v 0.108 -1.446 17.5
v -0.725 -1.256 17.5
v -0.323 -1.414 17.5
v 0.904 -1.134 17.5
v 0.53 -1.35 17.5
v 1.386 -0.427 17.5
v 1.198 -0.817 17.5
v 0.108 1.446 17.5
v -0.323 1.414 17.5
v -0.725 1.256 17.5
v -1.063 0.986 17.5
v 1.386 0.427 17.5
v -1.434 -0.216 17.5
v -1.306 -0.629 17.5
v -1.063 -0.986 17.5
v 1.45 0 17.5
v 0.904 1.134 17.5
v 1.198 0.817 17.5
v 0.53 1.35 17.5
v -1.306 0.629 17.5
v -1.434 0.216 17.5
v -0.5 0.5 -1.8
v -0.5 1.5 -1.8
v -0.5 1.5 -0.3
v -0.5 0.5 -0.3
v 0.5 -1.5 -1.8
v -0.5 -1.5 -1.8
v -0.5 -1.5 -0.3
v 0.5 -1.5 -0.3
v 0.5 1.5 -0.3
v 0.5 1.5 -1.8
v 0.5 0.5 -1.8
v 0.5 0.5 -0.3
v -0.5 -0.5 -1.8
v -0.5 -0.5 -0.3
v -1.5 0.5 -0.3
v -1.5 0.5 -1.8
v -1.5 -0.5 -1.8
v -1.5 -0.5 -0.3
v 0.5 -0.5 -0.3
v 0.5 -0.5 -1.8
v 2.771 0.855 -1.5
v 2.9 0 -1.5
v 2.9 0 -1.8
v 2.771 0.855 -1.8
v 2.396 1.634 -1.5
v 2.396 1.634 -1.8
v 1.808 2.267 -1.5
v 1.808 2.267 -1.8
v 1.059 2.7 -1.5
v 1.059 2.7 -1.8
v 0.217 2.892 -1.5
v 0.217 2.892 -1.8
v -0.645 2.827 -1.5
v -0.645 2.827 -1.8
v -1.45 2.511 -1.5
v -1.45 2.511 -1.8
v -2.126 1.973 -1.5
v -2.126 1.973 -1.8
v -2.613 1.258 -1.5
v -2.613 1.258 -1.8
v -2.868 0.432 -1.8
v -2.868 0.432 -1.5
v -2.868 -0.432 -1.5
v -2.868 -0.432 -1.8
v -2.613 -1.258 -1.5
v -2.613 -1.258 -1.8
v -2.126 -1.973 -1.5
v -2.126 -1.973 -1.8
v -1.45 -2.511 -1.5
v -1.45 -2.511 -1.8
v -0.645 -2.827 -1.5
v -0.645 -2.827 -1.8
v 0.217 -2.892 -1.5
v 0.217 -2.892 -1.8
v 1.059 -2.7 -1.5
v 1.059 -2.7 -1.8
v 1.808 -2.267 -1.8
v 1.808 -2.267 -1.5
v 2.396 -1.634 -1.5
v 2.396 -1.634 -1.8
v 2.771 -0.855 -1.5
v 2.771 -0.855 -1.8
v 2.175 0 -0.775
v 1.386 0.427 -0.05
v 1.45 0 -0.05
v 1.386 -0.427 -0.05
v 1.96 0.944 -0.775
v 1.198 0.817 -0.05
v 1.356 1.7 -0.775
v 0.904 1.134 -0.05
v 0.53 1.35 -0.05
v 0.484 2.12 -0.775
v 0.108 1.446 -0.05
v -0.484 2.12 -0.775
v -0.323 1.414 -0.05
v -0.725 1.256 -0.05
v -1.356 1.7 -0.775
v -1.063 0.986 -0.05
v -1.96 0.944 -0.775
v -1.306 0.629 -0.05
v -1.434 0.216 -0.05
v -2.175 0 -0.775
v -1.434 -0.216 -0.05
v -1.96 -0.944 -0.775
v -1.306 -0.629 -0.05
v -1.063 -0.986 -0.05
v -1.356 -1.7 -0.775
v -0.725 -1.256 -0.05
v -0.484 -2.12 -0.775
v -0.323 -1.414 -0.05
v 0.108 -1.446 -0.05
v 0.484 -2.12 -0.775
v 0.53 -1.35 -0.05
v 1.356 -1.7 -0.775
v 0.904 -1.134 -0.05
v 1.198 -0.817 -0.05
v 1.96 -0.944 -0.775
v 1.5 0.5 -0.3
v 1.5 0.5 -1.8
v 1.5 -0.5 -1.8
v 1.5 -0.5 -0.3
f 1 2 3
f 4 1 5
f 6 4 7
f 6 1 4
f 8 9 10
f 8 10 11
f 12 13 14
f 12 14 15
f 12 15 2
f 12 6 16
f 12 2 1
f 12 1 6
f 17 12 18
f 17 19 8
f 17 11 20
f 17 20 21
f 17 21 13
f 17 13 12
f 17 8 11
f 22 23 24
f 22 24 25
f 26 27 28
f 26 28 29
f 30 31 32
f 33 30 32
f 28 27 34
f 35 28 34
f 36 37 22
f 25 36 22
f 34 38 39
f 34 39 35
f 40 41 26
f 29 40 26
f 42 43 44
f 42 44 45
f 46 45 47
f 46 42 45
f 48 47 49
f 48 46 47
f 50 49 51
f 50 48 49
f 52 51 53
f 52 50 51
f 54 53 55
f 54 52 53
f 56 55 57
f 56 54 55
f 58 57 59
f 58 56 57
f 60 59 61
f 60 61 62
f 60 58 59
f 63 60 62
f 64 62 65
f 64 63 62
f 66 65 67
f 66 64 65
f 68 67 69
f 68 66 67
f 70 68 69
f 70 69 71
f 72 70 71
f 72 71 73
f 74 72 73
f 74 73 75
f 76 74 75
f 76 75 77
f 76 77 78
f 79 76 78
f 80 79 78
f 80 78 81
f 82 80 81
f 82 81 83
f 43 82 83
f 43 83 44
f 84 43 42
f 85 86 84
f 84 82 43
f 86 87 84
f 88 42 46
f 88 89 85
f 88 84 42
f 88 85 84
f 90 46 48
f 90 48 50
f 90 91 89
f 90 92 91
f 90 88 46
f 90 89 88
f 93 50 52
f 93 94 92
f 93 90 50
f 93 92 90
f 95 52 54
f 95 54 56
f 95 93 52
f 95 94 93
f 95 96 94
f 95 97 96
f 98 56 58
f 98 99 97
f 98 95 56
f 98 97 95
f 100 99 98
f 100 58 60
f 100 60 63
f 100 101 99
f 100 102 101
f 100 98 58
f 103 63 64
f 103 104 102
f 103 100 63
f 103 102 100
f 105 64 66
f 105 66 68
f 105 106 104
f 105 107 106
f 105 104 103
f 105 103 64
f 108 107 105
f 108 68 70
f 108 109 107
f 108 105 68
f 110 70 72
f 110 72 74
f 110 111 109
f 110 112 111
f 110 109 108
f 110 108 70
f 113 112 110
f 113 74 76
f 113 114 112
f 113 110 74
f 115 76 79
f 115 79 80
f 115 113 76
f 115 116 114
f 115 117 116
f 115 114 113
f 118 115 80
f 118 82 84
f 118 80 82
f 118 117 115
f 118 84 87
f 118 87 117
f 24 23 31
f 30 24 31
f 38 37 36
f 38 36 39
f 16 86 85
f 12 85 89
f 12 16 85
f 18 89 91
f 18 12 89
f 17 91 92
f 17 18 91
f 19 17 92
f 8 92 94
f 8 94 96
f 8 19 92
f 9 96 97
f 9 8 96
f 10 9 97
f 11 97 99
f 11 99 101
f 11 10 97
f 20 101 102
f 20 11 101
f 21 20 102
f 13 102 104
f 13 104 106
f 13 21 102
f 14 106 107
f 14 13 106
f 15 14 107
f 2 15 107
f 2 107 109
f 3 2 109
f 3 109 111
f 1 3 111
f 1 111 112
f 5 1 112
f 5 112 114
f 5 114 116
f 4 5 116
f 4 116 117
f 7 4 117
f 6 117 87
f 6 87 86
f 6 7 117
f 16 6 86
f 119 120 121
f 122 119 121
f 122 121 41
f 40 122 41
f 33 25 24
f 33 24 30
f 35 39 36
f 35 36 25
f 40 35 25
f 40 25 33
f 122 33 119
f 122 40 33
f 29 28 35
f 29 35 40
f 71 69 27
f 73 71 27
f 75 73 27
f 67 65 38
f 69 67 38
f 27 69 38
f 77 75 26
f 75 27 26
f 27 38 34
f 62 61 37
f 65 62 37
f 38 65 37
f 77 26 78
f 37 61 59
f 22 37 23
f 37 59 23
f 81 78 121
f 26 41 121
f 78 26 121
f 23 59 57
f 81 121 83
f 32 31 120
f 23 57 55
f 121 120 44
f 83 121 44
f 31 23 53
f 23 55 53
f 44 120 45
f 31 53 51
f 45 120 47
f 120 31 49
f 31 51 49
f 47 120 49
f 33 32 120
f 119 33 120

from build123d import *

# Parameters (mm, degrees)
F0_R        = 1.45
F1_DEPTH    = 17.5
F2_R        = 2.9
F3_DEPTH    = 1.8
F4_W        = 1
F4_H        = 1
F5_DEPTH    = 1.5
F6_S5_R     = 1.45
F6_T6_DEPTH = 6


# Not quite as in the source:
# - a fillet or chamfer that OpenCascade refuses, or shapes differently, is made with other operations: its cross-section is extruded or revolved along the edge and cut away or added


with BuildPart() as f1:
    # F0 (on Top) → F1 (new body)
    with BuildSketch(Plane.XY):
        Circle(F0_R)
    extrude(amount=F1_DEPTH)

    # F2 (on Top) → F3 (join)
    with BuildSketch(Plane.XY):
        Circle(F2_R)
    extrude(amount=-F3_DEPTH)

    # F4 (on face) → F5 (cut)
    with BuildSketch(Plane(origin=(0, 0, -1.8), x_dir=(1, 0, 0), z_dir=(0, 0, -1))):
        with Locations((1, 0)):
            Rectangle(F4_W, F4_H)
        Rectangle(F4_W, F4_H)
        with Locations((0, 1)):
            Rectangle(F4_W, F4_H)
        with Locations((-1, 0)):
            Rectangle(F4_W, F4_H)
        with Locations((0, -1)):
            Rectangle(F4_W, F4_H)
    extrude(amount=-F5_DEPTH, mode=Mode.SUBTRACT)

    # F6: chamfer of 1.5 on 1 edges, made by hand


with BuildPart() as f6_tool2:
    # F6_s3 → F6_t4 (revolve)
    with BuildSketch(Plane.XZ):
        Polygon((2.9, -1.5), (1.4, 0), (2.9, 0), align=None)
    revolve(axis=Axis((0, 0, 0), (0, 0, 1)))

    # F6_s5 → F6_t6 (cut, symmetric)
    with BuildSketch(Plane.XY.offset(-0.7)):
        Circle(F6_S5_R)
    extrude(amount=F6_T6_DEPTH, both=True, mode=Mode.SUBTRACT)


with BuildPart() as f1_1:
    add(f1.part)

    # F6_t1: cut F6_tool2
    add(f6_tool2.part, mode=Mode.SUBTRACT)


solid = f1_1.part
